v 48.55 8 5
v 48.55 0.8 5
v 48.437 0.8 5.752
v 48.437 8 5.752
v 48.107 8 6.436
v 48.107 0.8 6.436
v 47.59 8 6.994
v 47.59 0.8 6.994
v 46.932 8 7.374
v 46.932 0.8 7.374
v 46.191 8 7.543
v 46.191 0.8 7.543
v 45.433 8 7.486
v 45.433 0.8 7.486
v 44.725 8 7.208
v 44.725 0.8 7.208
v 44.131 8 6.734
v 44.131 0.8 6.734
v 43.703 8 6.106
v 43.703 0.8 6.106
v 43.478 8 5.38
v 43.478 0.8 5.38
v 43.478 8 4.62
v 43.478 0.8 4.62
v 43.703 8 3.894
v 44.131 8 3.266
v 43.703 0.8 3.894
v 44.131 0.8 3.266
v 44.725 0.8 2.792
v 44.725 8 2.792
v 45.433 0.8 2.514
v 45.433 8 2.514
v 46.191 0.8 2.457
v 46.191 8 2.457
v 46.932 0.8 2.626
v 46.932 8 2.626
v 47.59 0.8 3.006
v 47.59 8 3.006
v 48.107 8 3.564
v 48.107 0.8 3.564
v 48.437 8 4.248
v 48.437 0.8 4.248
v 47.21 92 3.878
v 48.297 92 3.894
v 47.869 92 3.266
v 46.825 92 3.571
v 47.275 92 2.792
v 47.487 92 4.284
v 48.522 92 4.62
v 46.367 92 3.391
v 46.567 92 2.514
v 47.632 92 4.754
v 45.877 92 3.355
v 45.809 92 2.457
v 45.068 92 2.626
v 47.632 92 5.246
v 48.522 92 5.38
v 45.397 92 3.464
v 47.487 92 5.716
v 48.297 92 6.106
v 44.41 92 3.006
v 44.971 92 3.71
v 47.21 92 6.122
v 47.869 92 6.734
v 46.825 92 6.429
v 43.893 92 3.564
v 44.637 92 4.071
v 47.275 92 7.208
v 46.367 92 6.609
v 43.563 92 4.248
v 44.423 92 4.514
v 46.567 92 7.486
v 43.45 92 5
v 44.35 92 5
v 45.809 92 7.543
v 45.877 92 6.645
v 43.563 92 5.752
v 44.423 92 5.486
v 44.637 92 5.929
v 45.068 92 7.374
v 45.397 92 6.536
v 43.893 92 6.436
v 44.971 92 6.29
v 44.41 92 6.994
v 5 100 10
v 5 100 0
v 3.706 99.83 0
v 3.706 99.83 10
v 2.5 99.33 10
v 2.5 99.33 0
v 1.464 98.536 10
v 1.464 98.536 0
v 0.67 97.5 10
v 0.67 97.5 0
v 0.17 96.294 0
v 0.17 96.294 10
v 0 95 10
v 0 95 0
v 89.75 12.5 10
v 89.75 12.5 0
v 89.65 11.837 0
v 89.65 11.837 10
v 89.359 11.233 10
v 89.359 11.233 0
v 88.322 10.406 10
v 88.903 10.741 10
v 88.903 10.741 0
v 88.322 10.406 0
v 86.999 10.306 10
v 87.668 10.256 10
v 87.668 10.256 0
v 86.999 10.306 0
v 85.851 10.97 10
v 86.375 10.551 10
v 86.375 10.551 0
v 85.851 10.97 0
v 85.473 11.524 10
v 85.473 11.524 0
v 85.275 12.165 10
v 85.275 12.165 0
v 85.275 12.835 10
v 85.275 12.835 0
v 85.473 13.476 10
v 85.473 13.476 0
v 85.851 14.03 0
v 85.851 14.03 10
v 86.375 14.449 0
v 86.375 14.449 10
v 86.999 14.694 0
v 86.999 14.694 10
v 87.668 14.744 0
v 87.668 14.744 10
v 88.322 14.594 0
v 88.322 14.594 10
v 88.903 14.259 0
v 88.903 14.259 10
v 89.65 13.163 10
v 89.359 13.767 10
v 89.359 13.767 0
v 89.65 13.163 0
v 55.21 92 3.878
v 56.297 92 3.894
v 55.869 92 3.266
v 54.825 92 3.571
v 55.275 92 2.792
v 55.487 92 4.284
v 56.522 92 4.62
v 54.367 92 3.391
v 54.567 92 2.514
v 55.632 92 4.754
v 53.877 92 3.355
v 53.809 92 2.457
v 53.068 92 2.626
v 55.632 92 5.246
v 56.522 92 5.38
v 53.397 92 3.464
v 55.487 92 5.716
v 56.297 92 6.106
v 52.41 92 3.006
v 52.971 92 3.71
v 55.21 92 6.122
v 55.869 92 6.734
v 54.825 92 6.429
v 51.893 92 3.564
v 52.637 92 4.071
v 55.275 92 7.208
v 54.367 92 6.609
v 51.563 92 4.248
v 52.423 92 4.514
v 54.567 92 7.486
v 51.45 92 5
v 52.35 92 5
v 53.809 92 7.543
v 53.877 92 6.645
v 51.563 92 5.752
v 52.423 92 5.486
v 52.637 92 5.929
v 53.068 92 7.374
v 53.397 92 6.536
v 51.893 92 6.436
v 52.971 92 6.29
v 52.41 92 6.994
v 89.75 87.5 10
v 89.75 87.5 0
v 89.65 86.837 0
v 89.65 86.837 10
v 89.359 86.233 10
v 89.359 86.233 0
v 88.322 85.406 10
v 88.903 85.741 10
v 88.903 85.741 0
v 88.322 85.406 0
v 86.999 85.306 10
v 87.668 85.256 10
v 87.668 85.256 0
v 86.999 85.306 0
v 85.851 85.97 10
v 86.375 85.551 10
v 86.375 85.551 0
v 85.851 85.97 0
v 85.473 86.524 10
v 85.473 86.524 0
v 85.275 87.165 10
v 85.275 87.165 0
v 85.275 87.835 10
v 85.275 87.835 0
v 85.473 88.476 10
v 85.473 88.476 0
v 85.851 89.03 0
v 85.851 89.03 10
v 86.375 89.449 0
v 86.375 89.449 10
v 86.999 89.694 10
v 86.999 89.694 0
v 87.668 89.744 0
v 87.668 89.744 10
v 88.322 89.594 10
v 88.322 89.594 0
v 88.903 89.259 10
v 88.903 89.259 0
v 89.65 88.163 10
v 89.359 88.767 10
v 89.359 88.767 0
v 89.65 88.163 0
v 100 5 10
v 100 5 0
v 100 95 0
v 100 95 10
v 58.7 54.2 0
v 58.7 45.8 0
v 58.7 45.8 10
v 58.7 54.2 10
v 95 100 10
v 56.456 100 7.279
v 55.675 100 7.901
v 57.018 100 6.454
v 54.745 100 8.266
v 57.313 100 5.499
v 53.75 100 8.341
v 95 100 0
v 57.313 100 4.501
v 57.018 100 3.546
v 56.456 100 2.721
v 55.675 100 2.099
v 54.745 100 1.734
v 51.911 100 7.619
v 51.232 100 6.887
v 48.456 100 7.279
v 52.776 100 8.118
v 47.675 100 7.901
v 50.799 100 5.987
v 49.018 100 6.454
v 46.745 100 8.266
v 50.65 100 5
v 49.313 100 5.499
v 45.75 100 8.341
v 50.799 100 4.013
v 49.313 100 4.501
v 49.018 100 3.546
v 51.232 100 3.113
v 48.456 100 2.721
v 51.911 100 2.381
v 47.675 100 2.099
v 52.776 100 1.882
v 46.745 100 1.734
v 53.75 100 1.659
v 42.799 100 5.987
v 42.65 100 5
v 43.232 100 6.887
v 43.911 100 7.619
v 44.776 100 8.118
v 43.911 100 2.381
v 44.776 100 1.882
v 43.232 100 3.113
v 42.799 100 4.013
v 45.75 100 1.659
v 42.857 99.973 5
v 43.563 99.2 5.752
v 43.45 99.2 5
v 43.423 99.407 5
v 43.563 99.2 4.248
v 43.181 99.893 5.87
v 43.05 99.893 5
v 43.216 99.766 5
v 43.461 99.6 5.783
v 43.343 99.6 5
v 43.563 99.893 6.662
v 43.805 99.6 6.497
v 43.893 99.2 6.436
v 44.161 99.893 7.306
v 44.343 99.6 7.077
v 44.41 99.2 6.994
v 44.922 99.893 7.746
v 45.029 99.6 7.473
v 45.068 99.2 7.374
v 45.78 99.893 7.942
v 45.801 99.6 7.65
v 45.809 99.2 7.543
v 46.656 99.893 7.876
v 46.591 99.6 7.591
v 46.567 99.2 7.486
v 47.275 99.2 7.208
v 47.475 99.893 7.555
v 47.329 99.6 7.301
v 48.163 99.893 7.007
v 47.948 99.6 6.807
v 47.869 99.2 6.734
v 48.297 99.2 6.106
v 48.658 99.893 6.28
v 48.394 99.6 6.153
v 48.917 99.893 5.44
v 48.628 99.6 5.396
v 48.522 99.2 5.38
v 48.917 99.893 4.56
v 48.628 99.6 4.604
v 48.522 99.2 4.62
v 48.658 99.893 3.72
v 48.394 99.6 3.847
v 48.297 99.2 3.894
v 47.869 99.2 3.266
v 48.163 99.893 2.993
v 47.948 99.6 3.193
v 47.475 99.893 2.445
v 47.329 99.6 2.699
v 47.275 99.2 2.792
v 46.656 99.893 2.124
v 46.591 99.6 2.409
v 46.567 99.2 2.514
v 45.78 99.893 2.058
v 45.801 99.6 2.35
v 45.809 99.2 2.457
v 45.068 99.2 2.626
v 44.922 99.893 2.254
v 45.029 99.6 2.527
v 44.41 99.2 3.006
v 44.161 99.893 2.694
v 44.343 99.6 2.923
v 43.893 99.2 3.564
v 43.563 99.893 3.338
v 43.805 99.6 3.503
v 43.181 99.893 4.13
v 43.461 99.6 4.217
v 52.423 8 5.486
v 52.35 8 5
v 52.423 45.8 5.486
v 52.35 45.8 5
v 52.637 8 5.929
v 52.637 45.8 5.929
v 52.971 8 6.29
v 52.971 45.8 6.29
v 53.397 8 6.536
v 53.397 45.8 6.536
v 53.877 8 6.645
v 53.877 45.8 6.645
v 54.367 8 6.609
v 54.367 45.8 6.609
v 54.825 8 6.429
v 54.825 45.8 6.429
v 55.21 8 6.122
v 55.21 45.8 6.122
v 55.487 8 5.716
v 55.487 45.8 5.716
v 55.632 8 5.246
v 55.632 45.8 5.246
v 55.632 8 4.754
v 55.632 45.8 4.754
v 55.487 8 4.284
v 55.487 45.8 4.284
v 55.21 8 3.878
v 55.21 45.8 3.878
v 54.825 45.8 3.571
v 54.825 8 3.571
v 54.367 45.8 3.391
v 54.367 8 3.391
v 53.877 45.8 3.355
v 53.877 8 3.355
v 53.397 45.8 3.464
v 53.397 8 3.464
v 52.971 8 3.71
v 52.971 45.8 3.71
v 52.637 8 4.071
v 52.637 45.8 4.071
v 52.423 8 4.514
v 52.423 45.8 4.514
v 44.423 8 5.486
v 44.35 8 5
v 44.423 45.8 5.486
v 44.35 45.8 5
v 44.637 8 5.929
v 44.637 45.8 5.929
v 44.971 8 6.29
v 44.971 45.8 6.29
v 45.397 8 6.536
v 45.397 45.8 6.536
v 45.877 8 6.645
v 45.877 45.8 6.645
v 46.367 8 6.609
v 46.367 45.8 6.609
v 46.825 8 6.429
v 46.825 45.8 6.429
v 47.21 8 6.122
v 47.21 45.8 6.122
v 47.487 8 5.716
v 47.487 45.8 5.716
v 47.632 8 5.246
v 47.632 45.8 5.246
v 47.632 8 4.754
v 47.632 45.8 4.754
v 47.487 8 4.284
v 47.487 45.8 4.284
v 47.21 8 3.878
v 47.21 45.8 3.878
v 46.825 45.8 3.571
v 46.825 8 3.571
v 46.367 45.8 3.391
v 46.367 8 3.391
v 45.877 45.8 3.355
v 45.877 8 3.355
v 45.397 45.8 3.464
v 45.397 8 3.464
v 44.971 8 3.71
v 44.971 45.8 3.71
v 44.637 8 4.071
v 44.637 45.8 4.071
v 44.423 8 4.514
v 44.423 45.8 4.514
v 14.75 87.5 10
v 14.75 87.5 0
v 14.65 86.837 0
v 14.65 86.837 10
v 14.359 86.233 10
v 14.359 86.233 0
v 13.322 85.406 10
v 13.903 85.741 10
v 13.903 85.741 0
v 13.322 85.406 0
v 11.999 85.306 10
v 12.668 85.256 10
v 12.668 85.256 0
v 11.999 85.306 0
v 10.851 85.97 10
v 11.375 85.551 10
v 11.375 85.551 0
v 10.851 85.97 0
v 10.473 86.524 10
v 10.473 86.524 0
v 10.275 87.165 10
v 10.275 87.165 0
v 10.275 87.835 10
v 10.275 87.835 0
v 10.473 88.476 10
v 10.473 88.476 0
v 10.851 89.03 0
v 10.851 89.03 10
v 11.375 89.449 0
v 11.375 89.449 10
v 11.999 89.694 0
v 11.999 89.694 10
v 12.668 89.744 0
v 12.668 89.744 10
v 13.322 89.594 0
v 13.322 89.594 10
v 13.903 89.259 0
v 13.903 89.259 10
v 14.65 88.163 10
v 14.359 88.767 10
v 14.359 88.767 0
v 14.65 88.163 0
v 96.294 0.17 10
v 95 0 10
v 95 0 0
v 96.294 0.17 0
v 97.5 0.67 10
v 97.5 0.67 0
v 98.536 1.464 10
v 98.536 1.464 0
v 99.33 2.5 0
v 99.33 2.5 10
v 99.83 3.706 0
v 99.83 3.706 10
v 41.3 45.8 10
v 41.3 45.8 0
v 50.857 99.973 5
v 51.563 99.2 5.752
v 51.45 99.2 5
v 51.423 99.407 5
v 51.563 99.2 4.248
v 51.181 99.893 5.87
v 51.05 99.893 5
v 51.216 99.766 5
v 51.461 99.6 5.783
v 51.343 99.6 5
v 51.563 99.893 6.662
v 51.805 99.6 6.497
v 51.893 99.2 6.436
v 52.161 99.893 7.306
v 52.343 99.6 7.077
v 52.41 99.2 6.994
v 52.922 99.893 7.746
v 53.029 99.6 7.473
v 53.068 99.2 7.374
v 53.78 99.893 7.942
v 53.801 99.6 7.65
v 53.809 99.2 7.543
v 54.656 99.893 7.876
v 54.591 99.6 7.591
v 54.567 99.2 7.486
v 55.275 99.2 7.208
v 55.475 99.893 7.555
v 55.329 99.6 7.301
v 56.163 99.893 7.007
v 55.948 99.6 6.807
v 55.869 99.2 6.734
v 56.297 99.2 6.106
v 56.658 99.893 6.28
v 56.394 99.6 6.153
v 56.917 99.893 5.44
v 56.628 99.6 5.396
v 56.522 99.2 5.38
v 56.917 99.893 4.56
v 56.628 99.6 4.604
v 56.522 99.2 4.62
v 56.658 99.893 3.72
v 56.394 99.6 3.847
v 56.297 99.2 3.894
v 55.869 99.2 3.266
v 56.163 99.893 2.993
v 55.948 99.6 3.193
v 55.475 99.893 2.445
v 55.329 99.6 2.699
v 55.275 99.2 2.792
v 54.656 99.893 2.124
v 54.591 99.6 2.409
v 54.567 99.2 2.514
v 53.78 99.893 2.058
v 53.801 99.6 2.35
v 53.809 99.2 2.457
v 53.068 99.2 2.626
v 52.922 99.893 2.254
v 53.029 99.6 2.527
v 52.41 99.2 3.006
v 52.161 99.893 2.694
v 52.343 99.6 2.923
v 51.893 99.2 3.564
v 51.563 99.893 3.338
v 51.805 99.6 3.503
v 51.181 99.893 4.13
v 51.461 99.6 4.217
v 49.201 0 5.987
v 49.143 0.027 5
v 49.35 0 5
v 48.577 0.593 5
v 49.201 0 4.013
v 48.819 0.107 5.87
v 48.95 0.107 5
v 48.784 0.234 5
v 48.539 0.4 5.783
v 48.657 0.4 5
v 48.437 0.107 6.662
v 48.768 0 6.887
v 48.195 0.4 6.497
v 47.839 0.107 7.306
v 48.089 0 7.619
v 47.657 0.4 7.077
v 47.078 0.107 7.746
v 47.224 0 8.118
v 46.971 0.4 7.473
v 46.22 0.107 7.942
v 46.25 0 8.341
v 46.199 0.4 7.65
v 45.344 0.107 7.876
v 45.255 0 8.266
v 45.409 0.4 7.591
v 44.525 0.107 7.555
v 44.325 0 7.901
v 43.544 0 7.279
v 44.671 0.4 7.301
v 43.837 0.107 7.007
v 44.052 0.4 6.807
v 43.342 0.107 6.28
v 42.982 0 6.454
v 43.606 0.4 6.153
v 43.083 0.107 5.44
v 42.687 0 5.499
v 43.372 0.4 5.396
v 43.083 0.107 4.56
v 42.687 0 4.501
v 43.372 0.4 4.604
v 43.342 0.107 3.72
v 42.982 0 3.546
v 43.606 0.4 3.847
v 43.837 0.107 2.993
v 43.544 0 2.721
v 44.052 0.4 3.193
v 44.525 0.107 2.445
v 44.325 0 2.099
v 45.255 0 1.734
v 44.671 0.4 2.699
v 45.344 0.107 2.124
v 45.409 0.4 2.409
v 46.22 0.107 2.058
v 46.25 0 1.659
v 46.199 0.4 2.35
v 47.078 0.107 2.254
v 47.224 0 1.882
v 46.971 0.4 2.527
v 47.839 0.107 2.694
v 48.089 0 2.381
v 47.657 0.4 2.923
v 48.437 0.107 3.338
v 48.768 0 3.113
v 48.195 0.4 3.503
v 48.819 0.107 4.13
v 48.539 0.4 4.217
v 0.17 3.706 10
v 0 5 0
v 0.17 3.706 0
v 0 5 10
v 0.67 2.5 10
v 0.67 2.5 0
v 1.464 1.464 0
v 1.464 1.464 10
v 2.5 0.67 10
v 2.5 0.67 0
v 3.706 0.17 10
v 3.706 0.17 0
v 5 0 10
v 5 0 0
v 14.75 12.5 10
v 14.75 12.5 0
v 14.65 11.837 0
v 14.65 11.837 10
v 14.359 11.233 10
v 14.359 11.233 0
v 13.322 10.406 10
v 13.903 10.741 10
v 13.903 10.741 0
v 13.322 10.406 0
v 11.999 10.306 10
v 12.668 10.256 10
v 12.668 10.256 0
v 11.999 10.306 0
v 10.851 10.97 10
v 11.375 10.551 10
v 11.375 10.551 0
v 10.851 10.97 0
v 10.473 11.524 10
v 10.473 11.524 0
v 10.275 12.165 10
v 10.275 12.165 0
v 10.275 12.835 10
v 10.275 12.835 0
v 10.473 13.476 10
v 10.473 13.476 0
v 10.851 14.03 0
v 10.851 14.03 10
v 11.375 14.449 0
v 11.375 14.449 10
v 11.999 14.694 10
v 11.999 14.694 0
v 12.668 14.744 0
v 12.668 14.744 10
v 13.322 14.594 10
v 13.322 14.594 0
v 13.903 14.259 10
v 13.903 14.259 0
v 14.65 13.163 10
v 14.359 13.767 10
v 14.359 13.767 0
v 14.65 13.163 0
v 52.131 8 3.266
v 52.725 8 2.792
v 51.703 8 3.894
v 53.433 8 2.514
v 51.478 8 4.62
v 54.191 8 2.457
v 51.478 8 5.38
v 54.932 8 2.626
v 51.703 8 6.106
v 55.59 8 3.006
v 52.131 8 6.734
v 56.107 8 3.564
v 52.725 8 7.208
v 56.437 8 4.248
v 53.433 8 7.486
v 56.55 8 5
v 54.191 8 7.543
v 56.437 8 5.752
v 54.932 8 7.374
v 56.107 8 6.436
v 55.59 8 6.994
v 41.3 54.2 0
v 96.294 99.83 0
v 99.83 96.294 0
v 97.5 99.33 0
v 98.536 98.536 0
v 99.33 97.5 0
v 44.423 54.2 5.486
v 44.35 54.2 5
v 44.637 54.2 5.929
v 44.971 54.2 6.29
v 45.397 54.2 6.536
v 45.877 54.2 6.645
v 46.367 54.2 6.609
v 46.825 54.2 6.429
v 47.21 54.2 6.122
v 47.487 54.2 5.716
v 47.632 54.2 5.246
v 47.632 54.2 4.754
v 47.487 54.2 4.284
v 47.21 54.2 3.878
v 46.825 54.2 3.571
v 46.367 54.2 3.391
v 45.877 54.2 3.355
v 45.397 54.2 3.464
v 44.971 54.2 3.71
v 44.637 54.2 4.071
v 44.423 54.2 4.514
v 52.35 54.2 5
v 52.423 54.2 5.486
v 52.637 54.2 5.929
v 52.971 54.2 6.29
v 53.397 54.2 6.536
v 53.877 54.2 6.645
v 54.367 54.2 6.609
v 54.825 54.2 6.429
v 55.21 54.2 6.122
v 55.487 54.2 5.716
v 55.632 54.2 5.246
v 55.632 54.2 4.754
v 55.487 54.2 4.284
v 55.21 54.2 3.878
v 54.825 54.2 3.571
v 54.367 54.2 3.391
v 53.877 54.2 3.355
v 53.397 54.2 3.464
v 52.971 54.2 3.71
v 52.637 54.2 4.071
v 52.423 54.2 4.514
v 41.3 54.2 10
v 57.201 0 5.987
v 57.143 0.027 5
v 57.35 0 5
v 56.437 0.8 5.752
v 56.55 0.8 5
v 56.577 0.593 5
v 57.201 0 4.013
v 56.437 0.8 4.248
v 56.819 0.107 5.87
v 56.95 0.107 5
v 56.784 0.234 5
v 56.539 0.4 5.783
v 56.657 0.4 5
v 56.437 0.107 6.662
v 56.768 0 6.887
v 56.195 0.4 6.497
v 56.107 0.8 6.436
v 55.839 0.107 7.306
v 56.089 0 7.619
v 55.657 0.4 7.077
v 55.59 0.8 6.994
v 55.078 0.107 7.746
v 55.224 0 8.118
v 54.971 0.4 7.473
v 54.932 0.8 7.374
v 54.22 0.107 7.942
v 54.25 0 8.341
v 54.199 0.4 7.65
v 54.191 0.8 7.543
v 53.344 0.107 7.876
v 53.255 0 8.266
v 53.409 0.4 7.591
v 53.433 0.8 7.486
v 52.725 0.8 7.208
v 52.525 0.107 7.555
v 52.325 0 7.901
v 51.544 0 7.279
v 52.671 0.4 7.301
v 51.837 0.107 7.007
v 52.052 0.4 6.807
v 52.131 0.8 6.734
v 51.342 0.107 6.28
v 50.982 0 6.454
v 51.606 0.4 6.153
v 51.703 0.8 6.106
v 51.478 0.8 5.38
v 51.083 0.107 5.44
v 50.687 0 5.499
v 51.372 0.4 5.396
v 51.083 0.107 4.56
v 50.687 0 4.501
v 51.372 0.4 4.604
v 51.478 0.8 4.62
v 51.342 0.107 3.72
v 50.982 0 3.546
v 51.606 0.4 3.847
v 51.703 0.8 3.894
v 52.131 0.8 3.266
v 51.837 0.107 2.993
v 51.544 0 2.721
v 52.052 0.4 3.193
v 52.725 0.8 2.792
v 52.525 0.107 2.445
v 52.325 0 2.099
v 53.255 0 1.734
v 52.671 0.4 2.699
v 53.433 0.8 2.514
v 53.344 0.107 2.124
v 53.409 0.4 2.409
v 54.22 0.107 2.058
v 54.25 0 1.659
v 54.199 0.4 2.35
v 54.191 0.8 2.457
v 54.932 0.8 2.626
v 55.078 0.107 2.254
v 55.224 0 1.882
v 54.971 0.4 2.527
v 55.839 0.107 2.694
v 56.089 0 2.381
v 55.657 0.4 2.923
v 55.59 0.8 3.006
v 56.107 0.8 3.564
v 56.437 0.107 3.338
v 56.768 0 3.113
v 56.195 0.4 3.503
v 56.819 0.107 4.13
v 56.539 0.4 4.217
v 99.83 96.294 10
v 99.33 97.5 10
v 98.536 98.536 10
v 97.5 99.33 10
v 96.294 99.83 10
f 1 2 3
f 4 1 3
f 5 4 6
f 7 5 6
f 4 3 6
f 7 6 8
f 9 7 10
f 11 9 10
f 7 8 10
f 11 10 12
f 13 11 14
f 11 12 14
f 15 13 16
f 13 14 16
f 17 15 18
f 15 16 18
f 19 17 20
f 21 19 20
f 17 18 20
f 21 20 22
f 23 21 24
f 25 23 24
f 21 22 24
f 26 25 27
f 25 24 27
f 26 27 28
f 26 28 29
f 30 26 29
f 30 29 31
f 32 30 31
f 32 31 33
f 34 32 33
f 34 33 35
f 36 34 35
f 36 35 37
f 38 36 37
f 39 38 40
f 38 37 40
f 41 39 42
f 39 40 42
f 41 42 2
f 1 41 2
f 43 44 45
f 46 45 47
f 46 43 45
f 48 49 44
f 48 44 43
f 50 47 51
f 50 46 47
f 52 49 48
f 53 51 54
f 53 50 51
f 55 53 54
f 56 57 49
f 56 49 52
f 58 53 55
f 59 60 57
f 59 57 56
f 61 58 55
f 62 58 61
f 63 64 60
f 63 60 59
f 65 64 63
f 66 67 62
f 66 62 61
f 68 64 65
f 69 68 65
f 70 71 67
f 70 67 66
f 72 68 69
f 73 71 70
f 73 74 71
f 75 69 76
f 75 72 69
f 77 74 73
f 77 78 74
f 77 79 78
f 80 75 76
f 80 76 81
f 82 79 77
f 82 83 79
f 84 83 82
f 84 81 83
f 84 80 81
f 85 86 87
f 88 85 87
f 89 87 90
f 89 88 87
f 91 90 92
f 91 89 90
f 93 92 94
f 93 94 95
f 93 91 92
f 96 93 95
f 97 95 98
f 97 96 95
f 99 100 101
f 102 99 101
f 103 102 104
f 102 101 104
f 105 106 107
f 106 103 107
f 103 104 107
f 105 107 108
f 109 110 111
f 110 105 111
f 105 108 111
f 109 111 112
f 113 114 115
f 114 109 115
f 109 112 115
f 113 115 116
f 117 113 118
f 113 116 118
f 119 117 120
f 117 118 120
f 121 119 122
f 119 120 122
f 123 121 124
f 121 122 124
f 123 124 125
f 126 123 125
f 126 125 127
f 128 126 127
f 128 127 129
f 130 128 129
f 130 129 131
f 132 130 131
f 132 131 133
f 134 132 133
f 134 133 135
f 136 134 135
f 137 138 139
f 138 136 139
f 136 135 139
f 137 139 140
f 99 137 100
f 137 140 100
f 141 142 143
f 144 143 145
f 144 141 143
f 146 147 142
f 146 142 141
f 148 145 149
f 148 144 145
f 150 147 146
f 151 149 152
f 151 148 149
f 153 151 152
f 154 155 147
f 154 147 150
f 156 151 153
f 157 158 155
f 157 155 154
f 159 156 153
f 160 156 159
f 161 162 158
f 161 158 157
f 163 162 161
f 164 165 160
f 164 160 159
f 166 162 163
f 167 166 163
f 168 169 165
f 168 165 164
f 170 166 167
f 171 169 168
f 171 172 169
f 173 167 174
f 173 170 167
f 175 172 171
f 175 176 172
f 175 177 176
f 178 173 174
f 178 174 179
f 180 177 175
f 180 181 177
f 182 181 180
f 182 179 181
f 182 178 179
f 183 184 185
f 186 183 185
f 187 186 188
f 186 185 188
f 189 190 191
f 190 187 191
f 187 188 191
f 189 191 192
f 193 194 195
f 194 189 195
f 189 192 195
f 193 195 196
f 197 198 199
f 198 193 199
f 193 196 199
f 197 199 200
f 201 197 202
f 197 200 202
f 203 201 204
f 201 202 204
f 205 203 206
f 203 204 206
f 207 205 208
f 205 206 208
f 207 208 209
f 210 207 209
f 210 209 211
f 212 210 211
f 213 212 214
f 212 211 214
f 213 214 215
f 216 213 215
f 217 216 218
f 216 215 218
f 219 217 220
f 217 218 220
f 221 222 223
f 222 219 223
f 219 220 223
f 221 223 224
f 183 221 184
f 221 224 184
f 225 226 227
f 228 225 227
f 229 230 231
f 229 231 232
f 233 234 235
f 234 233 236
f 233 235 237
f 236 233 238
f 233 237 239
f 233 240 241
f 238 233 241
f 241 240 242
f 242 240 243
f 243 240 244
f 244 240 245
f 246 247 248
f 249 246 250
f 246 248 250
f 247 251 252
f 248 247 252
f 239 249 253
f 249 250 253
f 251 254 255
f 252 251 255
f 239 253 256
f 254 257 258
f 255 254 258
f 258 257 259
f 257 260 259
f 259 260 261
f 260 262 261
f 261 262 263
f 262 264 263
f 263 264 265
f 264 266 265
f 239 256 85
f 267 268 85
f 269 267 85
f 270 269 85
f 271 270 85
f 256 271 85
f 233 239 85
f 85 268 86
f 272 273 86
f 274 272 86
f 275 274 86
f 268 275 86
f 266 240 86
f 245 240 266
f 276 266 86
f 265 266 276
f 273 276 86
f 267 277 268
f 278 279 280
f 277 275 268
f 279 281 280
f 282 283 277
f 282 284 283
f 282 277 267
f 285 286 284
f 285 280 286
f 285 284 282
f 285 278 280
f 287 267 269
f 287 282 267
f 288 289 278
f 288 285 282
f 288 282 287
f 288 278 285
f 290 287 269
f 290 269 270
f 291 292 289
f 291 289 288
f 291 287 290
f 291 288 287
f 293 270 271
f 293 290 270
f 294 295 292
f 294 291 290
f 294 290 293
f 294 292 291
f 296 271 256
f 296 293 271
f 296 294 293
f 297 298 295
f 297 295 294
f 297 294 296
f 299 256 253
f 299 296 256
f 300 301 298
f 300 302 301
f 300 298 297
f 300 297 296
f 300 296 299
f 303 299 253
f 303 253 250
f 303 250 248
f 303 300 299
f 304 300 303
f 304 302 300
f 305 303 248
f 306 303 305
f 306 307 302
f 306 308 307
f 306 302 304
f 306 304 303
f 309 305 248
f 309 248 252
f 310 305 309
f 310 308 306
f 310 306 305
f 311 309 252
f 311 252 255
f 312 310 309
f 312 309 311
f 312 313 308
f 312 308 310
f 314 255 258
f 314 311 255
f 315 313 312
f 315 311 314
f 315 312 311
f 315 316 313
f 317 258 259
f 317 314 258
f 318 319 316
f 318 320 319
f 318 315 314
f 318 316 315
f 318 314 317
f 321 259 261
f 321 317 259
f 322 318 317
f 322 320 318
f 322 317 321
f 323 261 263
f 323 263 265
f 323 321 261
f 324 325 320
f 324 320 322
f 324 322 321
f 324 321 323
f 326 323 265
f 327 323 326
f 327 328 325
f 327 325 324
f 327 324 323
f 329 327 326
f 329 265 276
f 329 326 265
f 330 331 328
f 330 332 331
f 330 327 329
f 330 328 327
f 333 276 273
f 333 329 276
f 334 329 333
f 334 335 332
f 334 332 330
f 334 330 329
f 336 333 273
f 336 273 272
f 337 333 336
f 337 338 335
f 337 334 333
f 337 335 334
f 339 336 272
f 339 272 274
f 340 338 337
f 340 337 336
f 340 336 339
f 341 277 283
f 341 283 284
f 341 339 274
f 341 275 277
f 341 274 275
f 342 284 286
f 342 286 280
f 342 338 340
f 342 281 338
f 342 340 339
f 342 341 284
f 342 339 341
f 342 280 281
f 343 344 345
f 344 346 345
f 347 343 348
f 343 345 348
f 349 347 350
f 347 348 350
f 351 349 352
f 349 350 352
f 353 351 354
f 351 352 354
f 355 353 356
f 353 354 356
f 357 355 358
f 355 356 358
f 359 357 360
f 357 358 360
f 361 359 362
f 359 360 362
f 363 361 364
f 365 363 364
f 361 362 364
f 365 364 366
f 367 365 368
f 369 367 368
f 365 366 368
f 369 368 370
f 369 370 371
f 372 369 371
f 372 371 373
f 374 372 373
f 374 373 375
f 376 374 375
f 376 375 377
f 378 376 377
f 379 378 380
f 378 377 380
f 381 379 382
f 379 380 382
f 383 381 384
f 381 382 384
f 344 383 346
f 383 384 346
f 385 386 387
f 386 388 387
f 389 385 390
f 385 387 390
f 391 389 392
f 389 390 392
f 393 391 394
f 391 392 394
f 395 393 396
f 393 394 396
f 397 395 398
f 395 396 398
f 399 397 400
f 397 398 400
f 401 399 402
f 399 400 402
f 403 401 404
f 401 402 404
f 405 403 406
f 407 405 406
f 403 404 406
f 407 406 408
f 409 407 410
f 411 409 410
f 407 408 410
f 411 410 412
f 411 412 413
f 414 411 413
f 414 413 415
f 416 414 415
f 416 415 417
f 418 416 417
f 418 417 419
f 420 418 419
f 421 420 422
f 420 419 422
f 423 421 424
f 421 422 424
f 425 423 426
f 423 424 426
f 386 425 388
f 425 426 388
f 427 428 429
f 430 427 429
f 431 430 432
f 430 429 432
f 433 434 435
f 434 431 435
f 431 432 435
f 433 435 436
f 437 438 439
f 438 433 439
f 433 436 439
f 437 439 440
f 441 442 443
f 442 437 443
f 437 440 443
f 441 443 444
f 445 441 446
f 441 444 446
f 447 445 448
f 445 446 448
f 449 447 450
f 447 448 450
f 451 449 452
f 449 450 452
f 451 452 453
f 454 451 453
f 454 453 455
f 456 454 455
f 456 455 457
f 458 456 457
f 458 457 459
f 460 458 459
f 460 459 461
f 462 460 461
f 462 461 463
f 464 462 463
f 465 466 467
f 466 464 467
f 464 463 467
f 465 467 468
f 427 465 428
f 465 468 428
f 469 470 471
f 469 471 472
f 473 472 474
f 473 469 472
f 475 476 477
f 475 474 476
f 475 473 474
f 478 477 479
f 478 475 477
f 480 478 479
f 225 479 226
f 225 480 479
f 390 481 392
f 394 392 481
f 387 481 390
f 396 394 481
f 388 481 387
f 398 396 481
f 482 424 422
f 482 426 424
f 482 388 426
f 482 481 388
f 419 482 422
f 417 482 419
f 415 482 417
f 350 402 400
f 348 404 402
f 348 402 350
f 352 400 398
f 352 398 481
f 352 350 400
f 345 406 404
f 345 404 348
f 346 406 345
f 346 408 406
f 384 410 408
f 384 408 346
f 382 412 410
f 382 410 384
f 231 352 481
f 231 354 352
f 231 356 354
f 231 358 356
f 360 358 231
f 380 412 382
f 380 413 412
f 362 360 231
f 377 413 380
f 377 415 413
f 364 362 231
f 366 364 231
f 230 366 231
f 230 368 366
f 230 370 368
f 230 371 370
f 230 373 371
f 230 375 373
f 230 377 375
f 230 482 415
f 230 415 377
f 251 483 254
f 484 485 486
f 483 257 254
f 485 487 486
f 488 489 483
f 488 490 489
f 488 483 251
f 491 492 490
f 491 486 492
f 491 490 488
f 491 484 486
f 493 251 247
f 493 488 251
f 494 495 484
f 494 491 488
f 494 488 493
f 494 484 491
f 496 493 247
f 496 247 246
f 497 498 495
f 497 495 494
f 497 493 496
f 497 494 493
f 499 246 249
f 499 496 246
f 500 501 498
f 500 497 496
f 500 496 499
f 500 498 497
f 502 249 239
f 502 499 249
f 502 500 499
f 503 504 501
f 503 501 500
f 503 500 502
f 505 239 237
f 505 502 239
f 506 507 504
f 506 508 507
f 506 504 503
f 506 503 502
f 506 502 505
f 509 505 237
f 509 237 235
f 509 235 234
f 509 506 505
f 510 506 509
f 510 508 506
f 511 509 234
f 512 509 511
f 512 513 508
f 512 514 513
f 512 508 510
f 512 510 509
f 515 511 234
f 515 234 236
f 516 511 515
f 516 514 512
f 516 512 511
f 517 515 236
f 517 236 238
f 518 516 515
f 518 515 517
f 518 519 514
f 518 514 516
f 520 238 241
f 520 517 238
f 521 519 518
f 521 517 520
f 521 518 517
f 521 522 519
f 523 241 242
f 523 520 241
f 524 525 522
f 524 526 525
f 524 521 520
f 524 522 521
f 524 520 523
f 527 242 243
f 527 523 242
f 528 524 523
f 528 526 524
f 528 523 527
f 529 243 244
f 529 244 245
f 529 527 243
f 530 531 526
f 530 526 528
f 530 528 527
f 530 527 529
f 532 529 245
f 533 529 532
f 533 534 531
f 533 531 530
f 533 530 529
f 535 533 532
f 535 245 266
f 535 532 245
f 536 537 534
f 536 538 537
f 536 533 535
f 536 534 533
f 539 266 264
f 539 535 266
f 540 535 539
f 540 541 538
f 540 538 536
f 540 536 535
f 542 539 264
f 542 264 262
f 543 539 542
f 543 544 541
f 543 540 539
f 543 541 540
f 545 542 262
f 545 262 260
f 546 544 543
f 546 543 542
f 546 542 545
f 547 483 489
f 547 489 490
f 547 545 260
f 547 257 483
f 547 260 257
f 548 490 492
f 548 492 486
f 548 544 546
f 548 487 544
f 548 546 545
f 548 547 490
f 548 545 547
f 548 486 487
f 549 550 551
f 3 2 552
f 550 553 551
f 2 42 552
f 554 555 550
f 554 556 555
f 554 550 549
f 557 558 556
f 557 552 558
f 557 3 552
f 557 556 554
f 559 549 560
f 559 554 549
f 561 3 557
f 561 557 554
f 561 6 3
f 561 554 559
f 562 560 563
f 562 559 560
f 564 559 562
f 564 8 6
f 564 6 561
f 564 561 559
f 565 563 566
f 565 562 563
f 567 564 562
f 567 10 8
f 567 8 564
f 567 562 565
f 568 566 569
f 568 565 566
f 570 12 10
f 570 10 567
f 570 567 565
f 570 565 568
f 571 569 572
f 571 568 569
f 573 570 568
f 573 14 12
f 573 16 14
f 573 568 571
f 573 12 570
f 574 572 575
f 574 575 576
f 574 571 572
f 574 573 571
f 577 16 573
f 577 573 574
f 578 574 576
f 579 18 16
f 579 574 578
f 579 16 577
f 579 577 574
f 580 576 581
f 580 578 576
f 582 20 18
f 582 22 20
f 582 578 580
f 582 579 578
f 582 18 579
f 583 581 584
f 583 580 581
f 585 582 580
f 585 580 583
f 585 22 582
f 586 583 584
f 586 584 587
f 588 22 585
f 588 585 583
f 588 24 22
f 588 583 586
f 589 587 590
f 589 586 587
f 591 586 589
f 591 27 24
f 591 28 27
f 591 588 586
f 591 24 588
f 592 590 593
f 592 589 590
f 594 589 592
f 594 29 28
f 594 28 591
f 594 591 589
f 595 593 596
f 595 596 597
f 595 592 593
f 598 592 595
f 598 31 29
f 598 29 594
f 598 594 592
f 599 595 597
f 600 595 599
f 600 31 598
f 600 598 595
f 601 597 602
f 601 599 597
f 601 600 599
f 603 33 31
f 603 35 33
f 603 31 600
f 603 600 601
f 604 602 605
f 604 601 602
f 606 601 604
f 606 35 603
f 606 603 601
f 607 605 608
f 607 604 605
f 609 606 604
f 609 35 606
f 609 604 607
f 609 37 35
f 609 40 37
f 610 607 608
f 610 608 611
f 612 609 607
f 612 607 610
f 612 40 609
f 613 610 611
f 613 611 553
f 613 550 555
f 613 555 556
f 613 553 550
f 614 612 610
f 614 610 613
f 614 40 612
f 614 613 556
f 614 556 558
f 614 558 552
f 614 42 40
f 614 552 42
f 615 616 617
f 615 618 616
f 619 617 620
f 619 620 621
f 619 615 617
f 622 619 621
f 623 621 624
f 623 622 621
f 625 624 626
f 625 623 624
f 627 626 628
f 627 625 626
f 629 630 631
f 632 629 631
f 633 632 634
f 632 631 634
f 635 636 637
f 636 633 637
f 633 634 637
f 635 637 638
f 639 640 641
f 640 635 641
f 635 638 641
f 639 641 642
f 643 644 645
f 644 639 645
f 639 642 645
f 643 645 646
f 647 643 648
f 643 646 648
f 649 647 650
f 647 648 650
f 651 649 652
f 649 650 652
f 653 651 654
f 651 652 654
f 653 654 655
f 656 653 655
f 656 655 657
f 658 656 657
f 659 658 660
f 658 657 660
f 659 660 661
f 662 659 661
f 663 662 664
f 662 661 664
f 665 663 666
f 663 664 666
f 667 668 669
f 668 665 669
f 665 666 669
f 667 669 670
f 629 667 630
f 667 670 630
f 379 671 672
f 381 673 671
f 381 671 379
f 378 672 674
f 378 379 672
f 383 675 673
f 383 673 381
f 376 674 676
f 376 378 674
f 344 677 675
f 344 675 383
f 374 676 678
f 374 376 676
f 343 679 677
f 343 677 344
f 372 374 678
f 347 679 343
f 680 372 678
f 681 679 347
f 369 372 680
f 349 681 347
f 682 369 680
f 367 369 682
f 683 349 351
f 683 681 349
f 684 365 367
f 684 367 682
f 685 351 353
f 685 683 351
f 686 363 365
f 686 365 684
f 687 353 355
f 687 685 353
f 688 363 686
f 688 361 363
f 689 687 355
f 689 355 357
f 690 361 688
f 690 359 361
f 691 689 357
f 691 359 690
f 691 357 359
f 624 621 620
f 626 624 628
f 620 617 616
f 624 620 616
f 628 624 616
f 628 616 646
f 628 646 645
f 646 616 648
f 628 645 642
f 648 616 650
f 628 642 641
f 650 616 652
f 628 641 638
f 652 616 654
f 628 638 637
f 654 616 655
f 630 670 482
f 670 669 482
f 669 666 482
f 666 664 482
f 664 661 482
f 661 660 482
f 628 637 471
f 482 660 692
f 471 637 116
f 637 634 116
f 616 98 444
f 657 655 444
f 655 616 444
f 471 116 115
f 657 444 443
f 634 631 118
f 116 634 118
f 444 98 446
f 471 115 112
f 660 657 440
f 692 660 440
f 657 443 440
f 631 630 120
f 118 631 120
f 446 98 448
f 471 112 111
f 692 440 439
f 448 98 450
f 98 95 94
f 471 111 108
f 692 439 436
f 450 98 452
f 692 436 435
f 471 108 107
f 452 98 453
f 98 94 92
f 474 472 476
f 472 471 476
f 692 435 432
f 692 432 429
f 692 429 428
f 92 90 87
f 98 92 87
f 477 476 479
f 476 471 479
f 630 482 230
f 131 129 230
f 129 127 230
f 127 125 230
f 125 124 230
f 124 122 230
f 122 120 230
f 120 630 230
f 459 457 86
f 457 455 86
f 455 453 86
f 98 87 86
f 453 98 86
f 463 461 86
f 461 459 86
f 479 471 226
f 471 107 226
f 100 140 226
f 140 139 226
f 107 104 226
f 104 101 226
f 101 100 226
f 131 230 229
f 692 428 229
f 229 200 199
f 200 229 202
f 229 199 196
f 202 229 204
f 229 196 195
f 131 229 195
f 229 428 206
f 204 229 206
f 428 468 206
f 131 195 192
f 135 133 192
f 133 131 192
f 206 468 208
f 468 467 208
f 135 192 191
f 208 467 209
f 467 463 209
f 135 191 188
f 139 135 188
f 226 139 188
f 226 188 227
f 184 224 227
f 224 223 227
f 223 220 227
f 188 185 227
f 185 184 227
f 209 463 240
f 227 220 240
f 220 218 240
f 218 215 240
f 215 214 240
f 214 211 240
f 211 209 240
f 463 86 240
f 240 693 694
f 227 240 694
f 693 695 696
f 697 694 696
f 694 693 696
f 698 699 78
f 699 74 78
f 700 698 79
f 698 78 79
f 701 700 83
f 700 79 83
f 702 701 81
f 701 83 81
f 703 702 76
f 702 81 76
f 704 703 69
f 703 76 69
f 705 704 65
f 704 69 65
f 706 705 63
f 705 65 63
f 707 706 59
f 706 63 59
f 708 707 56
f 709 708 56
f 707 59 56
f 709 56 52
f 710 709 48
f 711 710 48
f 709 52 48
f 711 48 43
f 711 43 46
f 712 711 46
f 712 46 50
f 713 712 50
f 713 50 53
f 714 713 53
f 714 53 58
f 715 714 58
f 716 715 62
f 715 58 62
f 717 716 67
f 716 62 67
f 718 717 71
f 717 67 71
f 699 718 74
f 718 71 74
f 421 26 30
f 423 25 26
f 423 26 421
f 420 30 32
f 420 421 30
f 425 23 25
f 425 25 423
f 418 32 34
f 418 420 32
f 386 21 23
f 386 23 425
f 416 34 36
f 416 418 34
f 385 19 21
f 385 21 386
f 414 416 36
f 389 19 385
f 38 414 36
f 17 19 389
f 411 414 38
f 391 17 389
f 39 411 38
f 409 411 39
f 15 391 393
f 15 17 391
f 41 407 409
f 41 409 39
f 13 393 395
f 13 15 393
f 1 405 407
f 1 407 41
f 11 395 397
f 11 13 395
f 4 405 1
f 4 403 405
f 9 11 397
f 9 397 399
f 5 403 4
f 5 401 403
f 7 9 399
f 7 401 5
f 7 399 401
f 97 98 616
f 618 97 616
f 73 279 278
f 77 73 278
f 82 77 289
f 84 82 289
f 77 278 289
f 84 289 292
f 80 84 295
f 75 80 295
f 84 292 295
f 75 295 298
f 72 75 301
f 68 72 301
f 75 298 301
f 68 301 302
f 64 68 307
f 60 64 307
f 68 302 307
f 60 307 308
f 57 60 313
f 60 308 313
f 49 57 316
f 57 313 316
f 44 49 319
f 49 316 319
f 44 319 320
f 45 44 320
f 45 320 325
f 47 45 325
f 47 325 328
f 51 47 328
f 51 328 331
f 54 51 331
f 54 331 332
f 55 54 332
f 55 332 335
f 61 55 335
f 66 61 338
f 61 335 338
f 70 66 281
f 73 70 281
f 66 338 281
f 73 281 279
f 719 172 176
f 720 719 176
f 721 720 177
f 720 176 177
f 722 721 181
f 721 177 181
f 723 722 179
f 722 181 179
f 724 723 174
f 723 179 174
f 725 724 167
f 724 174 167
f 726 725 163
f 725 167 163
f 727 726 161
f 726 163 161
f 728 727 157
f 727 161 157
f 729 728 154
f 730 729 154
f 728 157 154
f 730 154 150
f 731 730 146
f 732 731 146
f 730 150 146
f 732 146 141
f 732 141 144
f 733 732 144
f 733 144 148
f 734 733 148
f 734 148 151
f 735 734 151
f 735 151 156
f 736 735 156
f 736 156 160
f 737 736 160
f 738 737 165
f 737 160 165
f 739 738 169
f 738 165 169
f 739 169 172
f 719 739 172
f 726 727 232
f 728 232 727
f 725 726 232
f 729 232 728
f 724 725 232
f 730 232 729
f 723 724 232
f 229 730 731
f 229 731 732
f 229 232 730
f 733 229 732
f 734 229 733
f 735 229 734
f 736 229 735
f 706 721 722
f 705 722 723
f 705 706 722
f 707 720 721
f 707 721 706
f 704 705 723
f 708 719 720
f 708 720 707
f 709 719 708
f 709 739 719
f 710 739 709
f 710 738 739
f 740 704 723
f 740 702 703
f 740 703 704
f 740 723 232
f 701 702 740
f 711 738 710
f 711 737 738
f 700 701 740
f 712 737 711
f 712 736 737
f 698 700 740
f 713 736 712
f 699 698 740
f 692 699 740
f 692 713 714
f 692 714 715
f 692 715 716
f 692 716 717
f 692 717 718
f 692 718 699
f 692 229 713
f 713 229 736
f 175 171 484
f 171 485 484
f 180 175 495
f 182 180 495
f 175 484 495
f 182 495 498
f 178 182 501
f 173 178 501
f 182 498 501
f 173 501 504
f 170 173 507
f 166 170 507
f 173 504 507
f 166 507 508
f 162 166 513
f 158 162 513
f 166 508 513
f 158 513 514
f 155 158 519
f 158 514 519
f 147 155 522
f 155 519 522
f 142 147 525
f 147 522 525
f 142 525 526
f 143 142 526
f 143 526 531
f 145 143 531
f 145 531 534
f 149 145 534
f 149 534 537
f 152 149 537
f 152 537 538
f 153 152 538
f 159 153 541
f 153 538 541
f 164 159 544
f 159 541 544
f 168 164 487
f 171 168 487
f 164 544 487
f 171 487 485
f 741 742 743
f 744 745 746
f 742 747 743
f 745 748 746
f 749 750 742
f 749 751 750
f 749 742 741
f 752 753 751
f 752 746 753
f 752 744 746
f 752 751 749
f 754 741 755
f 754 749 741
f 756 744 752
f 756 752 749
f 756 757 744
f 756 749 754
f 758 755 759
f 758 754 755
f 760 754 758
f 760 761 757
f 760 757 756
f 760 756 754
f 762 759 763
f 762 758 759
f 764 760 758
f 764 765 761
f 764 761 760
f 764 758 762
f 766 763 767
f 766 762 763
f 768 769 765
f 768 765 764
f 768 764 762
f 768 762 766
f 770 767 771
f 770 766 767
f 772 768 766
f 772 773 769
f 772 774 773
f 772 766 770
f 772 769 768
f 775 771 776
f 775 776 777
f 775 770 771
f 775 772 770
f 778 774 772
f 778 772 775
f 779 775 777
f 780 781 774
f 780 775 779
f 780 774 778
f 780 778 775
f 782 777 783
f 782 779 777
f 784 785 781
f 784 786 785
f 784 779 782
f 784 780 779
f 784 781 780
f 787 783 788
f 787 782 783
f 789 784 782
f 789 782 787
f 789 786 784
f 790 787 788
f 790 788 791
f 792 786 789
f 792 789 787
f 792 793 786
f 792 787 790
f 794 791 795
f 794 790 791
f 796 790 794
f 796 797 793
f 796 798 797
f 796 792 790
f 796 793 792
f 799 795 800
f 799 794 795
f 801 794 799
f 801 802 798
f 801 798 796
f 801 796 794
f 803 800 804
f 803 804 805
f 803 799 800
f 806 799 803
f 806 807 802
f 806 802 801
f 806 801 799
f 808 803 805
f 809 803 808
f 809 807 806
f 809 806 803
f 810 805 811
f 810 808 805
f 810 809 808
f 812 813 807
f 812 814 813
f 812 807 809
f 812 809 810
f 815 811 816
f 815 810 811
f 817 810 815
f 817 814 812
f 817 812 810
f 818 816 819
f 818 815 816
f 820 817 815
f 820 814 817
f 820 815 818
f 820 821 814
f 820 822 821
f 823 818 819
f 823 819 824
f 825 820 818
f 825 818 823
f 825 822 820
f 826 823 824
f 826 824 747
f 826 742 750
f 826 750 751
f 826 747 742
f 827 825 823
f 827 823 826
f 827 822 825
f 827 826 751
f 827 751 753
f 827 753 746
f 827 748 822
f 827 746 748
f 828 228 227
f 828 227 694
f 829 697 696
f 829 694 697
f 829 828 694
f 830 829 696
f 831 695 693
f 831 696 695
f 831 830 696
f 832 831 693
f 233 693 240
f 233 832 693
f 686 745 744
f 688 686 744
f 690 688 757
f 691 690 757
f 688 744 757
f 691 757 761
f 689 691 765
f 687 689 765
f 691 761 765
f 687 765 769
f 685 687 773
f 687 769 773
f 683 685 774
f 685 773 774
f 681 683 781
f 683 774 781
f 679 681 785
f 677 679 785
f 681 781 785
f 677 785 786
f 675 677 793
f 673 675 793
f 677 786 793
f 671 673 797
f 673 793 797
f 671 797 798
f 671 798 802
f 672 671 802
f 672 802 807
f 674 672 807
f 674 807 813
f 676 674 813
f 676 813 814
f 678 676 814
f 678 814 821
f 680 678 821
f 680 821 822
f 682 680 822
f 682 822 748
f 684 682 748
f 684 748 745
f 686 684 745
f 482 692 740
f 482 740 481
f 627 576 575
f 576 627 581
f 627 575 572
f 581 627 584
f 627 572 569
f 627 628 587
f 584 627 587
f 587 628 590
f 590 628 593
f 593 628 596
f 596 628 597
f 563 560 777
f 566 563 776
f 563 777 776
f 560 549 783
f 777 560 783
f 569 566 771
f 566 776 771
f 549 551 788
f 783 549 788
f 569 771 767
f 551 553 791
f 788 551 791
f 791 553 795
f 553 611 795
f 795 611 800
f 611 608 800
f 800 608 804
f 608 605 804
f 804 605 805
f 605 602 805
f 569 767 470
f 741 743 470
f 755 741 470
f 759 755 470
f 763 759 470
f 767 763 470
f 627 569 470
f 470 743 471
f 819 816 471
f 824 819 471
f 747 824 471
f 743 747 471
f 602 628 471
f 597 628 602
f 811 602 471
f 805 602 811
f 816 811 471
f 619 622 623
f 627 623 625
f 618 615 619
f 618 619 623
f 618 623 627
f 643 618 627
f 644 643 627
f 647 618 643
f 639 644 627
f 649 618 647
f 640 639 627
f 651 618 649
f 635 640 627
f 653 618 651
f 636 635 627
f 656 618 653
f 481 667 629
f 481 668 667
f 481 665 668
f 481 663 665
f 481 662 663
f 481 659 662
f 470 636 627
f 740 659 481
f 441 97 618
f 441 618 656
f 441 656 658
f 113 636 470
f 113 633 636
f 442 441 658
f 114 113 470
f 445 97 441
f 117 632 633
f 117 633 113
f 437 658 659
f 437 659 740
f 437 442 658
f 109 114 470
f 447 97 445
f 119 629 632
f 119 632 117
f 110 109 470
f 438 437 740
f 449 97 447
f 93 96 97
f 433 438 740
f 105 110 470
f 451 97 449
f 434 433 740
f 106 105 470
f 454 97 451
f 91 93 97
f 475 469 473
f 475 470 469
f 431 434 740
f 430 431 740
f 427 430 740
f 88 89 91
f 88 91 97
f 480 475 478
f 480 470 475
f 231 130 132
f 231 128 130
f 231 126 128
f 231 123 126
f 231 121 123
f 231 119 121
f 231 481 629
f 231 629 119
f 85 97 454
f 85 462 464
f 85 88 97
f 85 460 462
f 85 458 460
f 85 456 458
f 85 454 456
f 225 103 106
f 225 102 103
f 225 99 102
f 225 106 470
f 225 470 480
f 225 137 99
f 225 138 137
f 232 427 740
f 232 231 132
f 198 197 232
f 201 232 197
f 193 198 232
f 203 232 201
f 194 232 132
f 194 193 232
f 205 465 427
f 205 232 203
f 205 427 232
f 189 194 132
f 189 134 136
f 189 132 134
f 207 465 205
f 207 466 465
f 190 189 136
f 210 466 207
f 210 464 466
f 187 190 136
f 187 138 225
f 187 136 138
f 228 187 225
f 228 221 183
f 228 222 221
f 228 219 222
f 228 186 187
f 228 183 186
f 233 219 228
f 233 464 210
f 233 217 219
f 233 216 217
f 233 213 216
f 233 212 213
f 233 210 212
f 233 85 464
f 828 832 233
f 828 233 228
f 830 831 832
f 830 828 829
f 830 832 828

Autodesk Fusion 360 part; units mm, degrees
sketch "Sketch1" plane through (0, 0, 0) normal (0, 0, 1) x (1, 0, 0)
  line L0 (0, 0) -> (100, 0)
  line L1 (100, 0) -> (100, 100)
  line L2 (100, 100) -> (0, 100)
  line L3 (0, 100) -> (0, 0)
  line L4 (12.5, 87.5) -> (87.5, 87.5) construction
  line L5 (87.5, 87.5) -> (87.5, 12.5) construction
  line L6 (87.5, 12.5) -> (12.5, 12.5) construction
  line L7 (12.5, 12.5) -> (12.5, 87.5) construction
  line L8 (87.5, 50) -> (12.5, 50) construction
  line L9 (50, 87.5) -> (50, 12.5) construction
  circle A0 centre (12.5, 87.5) radius 2.25
  circle A1 centre (87.5, 87.5) radius 2.25
  circle A2 centre (12.5, 12.5) radius 2.25
  circle A3 centre (87.5, 12.5) radius 2.25
  line L10 (41.3, 45.8) -> (58.7, 45.8)
  line L11 (58.7, 45.8) -> (58.7, 54.2)
  line L12 (58.7, 54.2) -> (41.3, 54.2)
  line L13 (41.3, 54.2) -> (41.3, 45.8)
  dimension "d1" = 100
  dimension "d3" = 75
  dimension "d4" = 4.5
  dimension "d5" = 17.4
  dimension "d6" = 8.4
extrude "Extrude1" add sketch "Sketch1" along normal blind 10
sketch "Sketch2" plane through (0, 100, 0) normal (0, 1, 0) x (-1, 0, 0)
  line L0 (-100, 0) -> (0, 0)
  line L1 (0, 0) -> (0, 10)
  line L2 (0, 10) -> (-100, 10)
  line L3 (-100, 10) -> (-100, 0)
  circle A0 centre (-54, 5) radius 1.65
  circle A1 centre (-46, 5) radius 1.65
  line L4 (-50, 10) -> (-50, 0) construction
  line L5 (-54, 5) -> (-46, 5) construction
  dimension "d11" = 8
  dimension "d14" = 3.3
extrude "Extrude2" cut sketch "Sketch2" against normal up to surface (100 mm away) contours A0 | A1
sketch "Sketch3" plane through (0, 100, 0) normal (0, 1, 0) x (-1, 0, 0)
  circle A0 centre (-54, 5) radius 1.65
  circle A1 centre (-46, 5) radius 1.65
  line L0 (-100, 0) -> (0, 0)
  line L1 (0, 0) -> (0, 10)
  line L2 (0, 10) -> (-100, 10)
  line L3 (-100, 10) -> (-100, 0)
  circle A2 centre (-54, 5) radius 2.55
  circle A3 centre (-46, 5) radius 2.55
  dimension "d15" = 5.1
extrude "Extrude3" cut sketch "Sketch3" against normal blind 8 contours A2 | A3
sketch "Sketch4" plane through (0, 0, 0) normal (0, -1, 0) x (1, 0, 0)
  circle A0 centre (54, 5) radius 1.65
  circle A1 centre (46, 5) radius 1.65
  line L0 (0, 0) -> (100, 0)
  line L1 (100, 0) -> (100, 10)
  line L2 (100, 10) -> (0, 10)
  line L3 (0, 10) -> (0, 0)
  circle A2 centre (46, 5) radius 2.55
  circle A3 centre (54, 5) radius 2.55
  dimension "d18" = 5.1
extrude "Extrude4" cut sketch "Sketch4" against normal blind 8 contours A2 | A3
fillet "Fillet1" radius 0.8 4 edges at (48.3774, 100, 5.9221) (56.3774, 100, 5.9221) (51.6226, 0, 5.9221) (43.6226, 0, 5.9221)
fillet "Fillet3" radius 5 4 edges at (100, 0, 5) (0, 0, 5) (100, 100, 5) (0, 100, 5)
